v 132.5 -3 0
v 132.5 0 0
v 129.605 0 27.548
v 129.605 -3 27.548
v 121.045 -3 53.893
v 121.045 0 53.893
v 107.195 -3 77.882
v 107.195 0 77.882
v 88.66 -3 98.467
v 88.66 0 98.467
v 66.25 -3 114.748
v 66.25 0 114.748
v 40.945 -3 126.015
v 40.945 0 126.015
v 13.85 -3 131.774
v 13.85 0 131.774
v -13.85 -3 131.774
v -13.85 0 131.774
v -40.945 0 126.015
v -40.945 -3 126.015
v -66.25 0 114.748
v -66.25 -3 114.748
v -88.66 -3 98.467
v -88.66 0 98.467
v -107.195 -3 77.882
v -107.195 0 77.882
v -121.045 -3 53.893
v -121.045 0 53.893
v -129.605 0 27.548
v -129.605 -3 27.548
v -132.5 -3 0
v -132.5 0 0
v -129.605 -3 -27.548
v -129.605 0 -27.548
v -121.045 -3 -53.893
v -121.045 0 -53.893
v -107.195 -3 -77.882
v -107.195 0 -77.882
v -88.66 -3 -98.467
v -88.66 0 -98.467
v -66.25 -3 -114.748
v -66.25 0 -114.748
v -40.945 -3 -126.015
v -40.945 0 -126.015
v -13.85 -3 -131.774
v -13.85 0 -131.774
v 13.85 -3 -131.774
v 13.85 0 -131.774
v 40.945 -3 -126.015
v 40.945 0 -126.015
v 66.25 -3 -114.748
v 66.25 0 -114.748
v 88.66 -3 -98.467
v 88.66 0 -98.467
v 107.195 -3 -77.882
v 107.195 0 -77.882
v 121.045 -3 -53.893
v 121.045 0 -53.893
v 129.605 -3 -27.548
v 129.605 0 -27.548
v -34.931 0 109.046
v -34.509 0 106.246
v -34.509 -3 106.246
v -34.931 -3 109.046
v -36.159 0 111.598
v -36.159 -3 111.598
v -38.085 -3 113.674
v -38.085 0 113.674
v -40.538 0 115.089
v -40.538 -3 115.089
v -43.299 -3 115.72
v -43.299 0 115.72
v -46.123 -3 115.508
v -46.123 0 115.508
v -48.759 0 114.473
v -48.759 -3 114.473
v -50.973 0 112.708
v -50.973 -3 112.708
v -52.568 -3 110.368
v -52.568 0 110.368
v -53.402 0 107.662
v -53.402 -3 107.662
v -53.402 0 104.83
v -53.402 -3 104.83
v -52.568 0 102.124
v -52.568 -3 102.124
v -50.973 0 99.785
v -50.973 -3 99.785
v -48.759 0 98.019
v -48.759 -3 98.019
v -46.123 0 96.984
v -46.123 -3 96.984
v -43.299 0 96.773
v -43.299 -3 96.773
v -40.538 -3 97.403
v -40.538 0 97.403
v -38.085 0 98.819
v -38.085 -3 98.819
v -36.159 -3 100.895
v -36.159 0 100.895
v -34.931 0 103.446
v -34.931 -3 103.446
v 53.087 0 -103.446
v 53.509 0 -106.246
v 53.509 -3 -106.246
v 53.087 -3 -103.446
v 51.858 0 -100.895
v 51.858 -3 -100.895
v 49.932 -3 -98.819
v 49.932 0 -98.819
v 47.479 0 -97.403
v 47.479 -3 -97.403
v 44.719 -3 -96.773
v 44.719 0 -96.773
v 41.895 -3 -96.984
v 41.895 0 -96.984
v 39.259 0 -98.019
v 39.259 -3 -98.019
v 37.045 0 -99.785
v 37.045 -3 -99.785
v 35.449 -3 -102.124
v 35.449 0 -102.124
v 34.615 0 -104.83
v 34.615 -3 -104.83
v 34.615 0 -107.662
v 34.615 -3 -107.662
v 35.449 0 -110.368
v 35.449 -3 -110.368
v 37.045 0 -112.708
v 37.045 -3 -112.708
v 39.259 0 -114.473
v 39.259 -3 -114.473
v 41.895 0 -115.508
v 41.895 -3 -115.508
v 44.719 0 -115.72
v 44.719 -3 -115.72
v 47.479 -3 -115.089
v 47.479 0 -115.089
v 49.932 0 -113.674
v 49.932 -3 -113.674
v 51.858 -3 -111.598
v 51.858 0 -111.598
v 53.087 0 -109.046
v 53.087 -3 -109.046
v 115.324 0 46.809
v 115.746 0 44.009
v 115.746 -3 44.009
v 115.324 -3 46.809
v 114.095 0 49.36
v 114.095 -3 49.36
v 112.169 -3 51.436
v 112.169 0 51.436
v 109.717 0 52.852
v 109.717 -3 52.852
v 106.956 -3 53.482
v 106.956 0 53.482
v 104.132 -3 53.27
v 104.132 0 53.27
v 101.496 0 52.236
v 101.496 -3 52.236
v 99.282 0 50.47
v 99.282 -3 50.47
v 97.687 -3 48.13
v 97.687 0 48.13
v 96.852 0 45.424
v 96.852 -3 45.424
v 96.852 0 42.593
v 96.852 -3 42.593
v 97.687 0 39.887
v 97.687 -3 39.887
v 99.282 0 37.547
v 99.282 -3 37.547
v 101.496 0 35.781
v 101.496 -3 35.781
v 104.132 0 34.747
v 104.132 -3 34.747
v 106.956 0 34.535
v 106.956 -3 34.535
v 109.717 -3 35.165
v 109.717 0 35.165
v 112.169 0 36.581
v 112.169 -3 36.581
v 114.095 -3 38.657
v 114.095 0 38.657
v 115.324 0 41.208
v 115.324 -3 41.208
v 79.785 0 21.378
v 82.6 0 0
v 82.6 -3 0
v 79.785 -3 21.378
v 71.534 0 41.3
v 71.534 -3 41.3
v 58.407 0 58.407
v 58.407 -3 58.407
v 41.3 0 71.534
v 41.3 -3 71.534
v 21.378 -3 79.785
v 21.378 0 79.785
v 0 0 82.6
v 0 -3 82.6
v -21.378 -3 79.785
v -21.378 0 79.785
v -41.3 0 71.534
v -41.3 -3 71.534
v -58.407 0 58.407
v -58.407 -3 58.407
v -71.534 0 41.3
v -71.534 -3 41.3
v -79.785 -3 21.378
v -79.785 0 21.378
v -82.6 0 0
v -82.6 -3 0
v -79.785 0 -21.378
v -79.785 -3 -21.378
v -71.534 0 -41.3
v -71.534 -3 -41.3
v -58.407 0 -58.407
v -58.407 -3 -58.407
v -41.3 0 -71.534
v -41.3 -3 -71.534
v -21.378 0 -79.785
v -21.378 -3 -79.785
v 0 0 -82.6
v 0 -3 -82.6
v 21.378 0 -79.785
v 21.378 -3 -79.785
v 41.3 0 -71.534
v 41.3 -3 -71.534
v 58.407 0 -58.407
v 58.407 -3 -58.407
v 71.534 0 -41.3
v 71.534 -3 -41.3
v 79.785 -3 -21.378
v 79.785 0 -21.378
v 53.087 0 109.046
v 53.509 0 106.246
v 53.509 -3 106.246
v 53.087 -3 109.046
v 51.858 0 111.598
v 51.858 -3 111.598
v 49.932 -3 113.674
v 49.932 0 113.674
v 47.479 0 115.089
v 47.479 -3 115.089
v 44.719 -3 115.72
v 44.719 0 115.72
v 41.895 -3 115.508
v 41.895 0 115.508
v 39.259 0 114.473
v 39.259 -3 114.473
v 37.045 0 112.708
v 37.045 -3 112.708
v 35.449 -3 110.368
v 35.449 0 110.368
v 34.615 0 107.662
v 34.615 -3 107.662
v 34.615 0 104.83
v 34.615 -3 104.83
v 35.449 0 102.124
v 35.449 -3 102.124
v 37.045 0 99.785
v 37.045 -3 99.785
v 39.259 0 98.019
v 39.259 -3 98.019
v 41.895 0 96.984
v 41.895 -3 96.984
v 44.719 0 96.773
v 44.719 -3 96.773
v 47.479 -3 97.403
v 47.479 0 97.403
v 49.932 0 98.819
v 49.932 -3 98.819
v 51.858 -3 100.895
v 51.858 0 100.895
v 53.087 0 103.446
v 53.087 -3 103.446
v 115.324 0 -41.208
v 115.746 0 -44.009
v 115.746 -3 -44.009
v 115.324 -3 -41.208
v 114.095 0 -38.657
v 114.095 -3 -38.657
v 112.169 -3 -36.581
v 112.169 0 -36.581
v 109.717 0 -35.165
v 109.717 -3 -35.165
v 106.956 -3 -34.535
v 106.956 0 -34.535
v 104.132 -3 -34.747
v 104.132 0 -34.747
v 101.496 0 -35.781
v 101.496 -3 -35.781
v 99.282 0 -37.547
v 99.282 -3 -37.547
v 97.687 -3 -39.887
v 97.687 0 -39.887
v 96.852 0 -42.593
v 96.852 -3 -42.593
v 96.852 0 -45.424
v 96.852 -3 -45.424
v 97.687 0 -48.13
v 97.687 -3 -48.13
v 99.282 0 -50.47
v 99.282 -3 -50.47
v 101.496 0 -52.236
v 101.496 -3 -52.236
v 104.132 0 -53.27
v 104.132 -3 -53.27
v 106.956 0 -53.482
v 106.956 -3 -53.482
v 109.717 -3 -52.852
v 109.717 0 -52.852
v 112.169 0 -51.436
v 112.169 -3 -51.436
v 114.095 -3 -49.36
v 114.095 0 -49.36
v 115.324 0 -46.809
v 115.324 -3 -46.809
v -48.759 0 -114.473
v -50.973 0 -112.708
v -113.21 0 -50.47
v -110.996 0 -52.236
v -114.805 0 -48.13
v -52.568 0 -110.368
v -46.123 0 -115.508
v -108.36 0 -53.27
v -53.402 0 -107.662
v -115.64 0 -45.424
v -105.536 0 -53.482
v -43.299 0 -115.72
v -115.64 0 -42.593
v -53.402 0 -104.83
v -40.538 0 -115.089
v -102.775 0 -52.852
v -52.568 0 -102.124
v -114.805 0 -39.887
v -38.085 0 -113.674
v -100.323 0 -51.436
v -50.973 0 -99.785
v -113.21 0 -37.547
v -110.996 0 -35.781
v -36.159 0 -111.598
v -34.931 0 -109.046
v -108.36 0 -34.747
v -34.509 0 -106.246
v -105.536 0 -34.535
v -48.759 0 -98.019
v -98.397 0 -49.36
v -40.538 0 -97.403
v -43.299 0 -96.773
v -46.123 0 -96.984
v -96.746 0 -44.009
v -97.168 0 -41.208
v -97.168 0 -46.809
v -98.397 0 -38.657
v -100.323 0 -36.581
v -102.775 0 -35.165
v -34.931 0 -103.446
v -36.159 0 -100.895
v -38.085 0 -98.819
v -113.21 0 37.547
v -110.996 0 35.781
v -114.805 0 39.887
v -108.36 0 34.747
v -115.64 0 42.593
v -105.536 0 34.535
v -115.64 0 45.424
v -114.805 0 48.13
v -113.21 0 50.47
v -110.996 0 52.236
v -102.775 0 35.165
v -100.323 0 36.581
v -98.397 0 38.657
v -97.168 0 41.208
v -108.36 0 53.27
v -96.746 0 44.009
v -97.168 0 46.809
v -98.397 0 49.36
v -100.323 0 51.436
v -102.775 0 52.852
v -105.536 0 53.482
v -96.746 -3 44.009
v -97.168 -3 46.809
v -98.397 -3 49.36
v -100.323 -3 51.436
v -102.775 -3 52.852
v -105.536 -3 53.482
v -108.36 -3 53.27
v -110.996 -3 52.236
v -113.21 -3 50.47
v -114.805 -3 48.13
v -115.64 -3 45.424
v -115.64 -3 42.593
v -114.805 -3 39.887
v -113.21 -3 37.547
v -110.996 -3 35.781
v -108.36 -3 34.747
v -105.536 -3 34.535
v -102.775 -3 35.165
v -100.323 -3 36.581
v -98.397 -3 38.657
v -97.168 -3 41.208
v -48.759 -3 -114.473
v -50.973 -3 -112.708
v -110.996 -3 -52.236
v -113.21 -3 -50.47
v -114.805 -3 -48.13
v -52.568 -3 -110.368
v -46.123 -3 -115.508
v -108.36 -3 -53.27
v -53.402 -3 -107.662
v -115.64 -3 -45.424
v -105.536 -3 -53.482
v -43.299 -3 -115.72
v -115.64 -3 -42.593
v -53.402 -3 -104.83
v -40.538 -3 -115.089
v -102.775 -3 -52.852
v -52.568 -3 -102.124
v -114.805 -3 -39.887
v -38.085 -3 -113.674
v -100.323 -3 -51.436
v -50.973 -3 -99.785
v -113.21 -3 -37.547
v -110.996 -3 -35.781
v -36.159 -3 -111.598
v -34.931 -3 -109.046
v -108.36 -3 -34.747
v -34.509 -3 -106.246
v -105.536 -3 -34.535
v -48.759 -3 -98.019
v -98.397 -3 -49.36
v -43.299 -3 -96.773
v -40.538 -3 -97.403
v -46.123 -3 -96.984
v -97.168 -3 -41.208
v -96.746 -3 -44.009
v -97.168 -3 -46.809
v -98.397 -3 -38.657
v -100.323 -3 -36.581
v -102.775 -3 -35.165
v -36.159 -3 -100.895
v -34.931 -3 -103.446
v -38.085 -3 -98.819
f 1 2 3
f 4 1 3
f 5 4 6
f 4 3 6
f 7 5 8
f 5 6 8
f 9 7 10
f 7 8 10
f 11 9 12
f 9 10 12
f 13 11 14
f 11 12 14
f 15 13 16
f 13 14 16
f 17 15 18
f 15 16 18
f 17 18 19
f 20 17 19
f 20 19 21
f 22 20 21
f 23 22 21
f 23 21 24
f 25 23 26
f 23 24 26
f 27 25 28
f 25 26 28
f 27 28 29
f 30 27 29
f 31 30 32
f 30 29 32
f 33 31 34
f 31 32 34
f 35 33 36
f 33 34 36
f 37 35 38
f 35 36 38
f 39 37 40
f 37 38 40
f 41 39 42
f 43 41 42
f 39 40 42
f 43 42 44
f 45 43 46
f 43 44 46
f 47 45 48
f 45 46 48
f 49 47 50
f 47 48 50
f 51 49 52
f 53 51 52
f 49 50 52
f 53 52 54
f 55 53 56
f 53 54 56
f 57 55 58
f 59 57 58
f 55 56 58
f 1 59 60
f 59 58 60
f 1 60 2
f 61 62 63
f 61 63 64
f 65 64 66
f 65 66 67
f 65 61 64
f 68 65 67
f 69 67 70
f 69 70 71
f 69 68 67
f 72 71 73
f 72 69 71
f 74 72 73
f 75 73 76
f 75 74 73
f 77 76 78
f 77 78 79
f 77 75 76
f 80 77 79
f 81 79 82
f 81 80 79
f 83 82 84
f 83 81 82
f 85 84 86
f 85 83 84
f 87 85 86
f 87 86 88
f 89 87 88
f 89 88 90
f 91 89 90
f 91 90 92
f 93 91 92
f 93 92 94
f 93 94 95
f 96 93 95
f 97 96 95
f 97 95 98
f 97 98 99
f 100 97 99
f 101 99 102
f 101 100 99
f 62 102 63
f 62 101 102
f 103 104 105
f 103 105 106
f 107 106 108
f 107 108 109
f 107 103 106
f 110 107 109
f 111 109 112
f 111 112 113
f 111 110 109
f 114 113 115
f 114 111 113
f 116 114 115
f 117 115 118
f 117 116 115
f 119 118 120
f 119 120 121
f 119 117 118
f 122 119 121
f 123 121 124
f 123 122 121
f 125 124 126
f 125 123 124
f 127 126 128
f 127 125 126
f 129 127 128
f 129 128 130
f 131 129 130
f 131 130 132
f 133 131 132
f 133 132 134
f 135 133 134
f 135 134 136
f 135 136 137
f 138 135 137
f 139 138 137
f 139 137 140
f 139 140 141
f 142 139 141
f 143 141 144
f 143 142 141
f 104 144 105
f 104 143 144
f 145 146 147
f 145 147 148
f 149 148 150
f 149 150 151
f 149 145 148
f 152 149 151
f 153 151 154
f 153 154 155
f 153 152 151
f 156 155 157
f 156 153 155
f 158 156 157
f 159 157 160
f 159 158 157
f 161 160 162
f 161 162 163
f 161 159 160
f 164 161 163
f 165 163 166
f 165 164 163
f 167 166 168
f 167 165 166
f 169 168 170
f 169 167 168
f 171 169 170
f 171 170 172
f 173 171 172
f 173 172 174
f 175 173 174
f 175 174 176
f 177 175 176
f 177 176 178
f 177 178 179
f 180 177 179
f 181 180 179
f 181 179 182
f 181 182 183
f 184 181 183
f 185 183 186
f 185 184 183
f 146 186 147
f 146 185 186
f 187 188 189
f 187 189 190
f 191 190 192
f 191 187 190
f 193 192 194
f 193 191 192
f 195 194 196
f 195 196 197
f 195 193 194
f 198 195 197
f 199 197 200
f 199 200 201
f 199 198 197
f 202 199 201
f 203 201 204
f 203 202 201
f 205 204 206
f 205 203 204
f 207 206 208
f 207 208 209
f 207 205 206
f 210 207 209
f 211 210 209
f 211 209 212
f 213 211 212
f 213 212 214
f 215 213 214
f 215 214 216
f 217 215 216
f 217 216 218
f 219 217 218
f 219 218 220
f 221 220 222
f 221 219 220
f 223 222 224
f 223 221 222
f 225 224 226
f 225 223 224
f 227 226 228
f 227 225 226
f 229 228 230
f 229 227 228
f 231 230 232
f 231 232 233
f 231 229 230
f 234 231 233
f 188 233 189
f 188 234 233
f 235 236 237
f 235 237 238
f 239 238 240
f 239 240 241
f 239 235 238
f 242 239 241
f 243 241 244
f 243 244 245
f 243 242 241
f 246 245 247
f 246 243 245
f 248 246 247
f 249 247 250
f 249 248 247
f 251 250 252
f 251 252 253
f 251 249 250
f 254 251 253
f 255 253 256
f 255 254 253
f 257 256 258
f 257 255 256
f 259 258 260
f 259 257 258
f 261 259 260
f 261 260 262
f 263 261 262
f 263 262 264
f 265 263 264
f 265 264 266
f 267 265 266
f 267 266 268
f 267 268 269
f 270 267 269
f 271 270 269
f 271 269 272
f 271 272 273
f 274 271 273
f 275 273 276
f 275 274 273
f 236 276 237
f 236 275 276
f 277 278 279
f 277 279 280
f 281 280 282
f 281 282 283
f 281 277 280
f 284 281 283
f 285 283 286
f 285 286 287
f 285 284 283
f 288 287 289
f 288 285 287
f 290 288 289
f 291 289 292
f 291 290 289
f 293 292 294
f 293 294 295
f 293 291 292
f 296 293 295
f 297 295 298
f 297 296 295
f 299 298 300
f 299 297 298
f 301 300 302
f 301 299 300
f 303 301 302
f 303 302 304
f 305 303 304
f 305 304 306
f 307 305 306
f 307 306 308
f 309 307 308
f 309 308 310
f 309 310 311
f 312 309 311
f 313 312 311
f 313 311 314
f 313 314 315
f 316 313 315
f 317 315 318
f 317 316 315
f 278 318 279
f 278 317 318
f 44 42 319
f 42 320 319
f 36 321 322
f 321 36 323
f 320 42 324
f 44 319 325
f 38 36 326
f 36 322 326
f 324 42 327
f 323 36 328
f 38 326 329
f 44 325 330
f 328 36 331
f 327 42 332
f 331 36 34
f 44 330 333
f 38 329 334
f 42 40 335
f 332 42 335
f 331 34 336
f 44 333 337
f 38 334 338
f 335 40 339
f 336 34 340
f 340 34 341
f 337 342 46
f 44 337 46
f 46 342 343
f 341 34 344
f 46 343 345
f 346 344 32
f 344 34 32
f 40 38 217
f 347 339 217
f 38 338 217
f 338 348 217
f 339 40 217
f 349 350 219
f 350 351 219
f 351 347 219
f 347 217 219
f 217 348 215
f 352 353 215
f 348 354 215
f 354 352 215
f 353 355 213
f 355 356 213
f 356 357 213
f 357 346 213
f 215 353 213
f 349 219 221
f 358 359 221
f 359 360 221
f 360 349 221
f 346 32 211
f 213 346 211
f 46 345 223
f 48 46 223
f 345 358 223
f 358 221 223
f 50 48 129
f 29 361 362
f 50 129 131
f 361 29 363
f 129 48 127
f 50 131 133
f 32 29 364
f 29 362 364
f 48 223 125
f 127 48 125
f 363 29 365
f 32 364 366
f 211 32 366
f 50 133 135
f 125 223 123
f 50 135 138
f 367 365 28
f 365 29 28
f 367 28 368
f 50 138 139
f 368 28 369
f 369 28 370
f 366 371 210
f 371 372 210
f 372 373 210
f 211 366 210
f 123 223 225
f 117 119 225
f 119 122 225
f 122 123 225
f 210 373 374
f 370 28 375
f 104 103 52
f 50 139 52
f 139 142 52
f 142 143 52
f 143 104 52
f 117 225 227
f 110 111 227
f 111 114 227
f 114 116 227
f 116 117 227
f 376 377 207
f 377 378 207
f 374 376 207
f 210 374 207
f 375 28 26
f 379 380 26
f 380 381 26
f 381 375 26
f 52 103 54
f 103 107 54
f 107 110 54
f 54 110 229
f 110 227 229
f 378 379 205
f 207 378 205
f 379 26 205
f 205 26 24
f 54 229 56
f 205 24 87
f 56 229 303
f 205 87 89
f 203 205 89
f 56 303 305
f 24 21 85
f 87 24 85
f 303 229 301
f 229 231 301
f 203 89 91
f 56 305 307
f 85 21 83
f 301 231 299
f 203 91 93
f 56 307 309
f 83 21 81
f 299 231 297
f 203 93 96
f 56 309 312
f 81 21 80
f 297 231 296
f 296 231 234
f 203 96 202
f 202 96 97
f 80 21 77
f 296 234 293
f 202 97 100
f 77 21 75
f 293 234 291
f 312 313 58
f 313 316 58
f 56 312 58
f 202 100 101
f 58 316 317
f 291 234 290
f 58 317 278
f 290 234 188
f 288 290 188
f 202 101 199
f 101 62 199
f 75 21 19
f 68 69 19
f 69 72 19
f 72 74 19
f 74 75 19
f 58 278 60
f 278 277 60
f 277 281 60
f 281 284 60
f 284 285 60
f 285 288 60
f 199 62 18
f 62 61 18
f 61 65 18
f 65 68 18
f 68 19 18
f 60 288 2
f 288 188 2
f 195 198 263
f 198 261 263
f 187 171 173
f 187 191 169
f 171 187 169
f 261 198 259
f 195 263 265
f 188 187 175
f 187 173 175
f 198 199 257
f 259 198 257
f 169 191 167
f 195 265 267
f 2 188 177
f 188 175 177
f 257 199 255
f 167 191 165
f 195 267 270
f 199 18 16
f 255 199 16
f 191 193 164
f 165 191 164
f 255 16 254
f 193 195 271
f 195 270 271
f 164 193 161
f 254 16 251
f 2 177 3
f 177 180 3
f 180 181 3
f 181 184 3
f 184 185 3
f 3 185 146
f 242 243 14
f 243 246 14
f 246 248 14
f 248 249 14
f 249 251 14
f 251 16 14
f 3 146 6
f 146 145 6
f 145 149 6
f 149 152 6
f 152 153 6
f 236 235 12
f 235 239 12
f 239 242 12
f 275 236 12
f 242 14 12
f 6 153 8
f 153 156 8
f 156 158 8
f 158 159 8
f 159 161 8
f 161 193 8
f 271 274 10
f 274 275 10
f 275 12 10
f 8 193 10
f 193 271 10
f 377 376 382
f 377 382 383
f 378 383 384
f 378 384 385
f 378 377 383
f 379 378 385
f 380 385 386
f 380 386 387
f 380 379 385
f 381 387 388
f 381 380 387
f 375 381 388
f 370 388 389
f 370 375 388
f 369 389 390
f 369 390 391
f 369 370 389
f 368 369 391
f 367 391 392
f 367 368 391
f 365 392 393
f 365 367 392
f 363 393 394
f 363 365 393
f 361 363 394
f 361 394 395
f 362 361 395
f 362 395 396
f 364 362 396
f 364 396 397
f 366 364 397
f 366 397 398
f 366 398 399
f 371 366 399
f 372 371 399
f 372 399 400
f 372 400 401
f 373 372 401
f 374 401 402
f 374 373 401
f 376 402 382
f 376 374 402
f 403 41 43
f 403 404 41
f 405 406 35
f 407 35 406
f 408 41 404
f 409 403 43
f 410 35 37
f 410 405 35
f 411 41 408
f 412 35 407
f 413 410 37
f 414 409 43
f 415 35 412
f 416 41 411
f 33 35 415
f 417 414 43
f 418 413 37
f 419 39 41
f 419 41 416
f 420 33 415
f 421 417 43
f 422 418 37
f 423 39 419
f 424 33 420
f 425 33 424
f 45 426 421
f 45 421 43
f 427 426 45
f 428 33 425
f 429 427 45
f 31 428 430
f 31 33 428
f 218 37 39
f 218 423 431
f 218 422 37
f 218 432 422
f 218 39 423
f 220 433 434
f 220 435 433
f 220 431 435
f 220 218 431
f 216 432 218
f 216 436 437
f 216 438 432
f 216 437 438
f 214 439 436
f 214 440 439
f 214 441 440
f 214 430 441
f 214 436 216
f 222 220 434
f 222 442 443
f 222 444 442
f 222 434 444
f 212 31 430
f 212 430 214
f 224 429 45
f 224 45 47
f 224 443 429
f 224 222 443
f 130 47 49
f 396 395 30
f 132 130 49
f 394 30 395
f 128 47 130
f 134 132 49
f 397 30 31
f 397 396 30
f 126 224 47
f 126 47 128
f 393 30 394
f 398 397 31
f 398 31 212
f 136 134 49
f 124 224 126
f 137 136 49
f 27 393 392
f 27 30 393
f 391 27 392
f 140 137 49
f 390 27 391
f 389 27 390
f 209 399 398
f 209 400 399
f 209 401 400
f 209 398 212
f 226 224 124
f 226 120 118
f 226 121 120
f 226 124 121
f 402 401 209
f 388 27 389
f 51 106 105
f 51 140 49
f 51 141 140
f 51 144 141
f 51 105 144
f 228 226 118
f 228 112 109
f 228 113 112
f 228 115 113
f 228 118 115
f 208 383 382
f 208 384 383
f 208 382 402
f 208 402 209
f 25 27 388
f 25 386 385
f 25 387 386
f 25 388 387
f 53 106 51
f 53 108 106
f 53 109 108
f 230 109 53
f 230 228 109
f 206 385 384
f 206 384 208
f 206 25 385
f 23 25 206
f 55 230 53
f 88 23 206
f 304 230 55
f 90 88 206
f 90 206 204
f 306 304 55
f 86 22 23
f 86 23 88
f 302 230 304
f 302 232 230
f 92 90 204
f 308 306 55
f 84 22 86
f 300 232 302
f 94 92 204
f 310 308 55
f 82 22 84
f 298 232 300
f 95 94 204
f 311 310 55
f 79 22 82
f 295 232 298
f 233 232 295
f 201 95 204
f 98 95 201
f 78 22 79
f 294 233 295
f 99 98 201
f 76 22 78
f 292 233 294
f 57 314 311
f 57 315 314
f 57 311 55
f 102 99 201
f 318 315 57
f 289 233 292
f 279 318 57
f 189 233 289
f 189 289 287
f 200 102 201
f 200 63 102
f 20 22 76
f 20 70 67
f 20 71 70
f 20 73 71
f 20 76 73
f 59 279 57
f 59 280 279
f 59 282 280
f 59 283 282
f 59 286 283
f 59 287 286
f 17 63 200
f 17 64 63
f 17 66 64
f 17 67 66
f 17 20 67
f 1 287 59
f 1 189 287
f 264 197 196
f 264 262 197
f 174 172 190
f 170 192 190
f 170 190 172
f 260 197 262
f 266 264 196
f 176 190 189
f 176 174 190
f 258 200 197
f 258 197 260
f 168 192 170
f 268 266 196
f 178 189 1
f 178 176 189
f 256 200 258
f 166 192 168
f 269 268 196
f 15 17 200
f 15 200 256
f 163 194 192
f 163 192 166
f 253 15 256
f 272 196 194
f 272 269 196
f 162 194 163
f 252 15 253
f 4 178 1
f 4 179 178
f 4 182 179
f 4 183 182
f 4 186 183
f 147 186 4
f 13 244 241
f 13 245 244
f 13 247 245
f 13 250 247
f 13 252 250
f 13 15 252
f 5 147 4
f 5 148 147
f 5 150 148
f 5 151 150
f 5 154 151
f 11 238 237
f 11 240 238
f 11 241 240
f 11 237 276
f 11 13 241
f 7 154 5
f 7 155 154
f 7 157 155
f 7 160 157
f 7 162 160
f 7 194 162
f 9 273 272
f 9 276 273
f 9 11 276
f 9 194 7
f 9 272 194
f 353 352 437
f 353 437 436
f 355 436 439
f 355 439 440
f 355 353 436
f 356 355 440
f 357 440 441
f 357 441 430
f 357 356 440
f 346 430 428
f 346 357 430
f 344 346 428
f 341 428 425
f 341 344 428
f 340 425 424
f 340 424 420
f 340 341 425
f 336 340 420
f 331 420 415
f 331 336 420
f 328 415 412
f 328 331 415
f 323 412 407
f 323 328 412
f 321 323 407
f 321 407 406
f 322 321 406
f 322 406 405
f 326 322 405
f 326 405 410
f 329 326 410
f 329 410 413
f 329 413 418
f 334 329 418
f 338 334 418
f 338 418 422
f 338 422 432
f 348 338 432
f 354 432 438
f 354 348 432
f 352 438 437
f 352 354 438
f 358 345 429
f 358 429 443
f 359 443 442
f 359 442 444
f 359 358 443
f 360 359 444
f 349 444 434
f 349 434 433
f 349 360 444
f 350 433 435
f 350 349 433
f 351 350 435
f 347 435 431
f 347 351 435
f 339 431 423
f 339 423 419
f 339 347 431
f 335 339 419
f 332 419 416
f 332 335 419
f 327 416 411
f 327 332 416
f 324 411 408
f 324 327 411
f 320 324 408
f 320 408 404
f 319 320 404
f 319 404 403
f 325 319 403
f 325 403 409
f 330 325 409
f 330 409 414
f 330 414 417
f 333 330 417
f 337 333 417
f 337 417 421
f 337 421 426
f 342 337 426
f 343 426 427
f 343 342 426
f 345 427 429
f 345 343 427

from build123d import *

# Parameters (mm, degrees)
F0_R     = 132.5
F0_R_2   = 9.5
F0_R_3   = 82.6
F1_DEPTH = 3


with BuildPart() as f1:
    # F0 (on Front) → F1 (new body)
    with BuildSketch(Plane.XZ):
        Circle(F0_R)
        with Locations((-44.008595, -106.246146)):
            Circle(F0_R_2, mode=Mode.SUBTRACT)
        with Locations((-106.246146, -44.008595)):
            Circle(F0_R_2, mode=Mode.SUBTRACT)
        with Locations((44.008595, -106.246146)):
            Circle(F0_R_2, mode=Mode.SUBTRACT)
        with Locations((106.246146, -44.008595)):
            Circle(F0_R_2, mode=Mode.SUBTRACT)
        with Locations((-106.246146, 44.008595)):
            Circle(F0_R_2, mode=Mode.SUBTRACT)
        with Locations((-44.008595, 106.246146)):
            Circle(F0_R_2, mode=Mode.SUBTRACT)
        Circle(F0_R_3, mode=Mode.SUBTRACT)
        with Locations((106.246146, 44.008595)):
            Circle(F0_R_2, mode=Mode.SUBTRACT)
        with Locations((44.008595, 106.246146)):
            Circle(F0_R_2, mode=Mode.SUBTRACT)
    extrude(amount=F1_DEPTH)


solid = f1.part
